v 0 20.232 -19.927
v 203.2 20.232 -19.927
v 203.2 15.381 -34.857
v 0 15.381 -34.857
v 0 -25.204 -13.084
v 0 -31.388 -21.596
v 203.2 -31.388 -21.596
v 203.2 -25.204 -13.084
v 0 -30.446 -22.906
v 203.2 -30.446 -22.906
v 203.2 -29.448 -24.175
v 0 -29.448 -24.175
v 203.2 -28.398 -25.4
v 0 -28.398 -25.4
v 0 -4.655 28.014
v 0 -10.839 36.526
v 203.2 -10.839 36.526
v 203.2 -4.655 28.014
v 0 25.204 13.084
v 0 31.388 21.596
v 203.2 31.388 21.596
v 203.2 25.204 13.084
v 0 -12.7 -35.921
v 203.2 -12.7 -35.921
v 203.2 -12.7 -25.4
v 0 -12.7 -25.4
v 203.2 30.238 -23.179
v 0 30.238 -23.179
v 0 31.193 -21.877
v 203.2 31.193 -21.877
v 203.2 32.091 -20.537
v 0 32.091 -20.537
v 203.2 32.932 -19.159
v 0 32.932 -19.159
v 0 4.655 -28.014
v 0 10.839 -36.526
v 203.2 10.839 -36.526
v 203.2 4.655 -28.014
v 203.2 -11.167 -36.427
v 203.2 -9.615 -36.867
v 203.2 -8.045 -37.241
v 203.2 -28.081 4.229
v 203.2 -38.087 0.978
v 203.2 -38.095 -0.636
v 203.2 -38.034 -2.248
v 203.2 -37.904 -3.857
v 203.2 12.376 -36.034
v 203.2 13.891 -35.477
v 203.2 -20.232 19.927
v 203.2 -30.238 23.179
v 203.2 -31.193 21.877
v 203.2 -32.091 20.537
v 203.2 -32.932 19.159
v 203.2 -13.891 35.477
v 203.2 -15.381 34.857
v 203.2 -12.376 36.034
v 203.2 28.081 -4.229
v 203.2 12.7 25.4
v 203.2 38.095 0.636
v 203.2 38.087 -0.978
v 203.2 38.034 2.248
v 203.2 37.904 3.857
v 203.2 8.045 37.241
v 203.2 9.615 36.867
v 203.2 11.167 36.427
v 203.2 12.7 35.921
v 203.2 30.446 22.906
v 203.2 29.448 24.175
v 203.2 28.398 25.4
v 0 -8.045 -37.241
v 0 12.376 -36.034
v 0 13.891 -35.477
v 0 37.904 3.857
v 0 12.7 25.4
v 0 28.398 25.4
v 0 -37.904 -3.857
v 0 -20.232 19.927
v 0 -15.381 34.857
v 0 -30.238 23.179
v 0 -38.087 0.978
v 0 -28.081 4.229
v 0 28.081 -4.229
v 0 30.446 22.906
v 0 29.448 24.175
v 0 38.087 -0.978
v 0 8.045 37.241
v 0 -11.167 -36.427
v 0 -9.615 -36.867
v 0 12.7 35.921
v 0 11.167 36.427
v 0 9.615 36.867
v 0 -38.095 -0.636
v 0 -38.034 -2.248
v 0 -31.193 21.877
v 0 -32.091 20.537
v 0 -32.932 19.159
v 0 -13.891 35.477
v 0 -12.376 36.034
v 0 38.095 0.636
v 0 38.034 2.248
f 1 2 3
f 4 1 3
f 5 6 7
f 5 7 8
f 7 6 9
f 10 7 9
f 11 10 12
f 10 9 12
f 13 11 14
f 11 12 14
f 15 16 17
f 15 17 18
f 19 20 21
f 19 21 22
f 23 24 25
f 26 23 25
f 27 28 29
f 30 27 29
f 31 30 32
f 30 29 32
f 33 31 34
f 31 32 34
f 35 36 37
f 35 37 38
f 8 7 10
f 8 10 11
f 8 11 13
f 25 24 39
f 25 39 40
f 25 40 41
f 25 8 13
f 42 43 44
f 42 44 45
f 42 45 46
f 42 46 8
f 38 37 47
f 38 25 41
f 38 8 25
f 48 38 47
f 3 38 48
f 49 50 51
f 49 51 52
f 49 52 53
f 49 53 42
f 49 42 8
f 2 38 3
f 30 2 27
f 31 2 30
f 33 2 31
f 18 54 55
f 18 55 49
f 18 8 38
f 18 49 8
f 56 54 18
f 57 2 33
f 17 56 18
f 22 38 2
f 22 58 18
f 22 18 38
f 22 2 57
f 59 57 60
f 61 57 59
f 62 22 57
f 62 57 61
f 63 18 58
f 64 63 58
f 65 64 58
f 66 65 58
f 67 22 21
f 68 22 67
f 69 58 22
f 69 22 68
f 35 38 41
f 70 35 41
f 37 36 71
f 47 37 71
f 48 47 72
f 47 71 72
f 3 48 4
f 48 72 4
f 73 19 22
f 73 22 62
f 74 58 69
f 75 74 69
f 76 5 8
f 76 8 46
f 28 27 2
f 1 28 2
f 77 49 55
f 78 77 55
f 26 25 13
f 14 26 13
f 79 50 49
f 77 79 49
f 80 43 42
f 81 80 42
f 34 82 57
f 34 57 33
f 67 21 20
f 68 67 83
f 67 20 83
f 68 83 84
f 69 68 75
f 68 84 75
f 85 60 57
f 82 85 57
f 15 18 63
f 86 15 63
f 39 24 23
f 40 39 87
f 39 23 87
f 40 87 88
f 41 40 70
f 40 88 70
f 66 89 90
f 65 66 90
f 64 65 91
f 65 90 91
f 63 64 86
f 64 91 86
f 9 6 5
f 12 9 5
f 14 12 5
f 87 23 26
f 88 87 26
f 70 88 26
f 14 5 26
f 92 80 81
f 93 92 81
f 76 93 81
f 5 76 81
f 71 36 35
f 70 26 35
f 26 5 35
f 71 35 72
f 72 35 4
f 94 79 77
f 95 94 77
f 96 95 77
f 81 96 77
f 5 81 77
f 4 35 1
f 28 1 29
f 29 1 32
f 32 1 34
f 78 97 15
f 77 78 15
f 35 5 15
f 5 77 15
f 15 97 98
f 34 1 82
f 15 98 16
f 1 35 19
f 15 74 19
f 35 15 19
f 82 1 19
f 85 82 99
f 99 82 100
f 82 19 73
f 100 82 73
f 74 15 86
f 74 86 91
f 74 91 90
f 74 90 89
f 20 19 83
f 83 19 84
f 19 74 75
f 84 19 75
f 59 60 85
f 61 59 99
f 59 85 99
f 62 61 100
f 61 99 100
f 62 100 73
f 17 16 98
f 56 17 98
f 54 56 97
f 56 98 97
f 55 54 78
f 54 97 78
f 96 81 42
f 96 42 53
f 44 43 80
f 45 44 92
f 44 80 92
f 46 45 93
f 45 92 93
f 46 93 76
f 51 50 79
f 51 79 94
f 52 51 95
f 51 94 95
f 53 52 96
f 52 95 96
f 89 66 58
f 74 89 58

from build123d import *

# Parameters (mm, degrees)
F0_R     = 38.1
F1_DEPTH = 203.2
F3_DEPTH = 228.6


with BuildPart() as f1:
    # F0 (on Right) → F1 (new body)
    with BuildSketch(Plane.YZ):
        Circle(F0_R)
    extrude(amount=F1_DEPTH)

    # F2 (on face) → F3 (cut)
    with BuildSketch(Plane.YZ.offset(203.2)):
        with BuildLine():
            Line((12.7, 35.9210244843), (12.7, 25.4))
            Line((12.7, 25.4), (28.3980633142, 25.4))
            ThreePointArc((28.3980633142, 25.4), (21.211687606, 31.6492386781), (12.7, 35.9210244843))
        make_face()
        with BuildLine():
            ThreePointArc((37.9042612368, 3.8570688473), (35.7635714939, 13.1368547986), (31.3883642677, 21.595846559))
            Line((31.3883642677, 21.595846559), (25.2042612368, 13.084158953))
            Line((25.2042612368, 13.084158953), (37.9042612368, 3.8570688473))
        make_face()
        with BuildLine():
            ThreePointArc((32.9323196853, -19.1591315081), (36.6549866302, -10.3933611087), (38.0874402363, -0.9782107359))
            Line((38.0874402363, -0.9782107359), (28.0813513425, -4.2293860998))
            Line((28.0813513425, -4.2293860998), (32.9323196853, -19.1591315081))
        make_face()
        with BuildLine():
            ThreePointArc((15.3813513425, -34.8571948223), (23.545442731, -29.9536663299), (30.2384085792, -23.1786247779))
            Line((30.2384085792, -23.1786247779), (20.2323196853, -19.9274494141))
            Line((20.2323196853, -19.9274494141), (15.3813513425, -34.8571948223))
        make_face()
        with BuildLine():
            Line((-4.6552295797, 28.0139043612), (8.0447704203, 37.2409944669))
            ThreePointArc((8.0447704203, 37.2409944669), (-1.4423399886, 38.0726891007), (-10.8393326105, 36.5255919673))
            Line((-10.8393326105, 36.5255919673), (-4.6552295797, 28.0139043612))
        make_face()
        with BuildLine():
            Line((-25.2042612368, -13.084158953), (-37.9042612368, -3.8570688473))
            ThreePointArc((-37.9042612368, -3.8570688473), (-35.7635714939, -13.1368547986), (-31.3883642677, -21.595846559))
            Line((-31.3883642677, -21.595846559), (-25.2042612368, -13.084158953))
        make_face()
        with BuildLine():
            Line((-12.7, -25.4), (-28.3980633142, -25.4))
            ThreePointArc((-28.3980633142, -25.4), (-21.211687606, -31.6492386781), (-12.7, -35.9210244843))
            Line((-12.7, -35.9210244843), (-12.7, -25.4))
        make_face()
        with BuildLine():
            ThreePointArc((-8.0447704203, -37.2409944669), (1.4423399886, -38.0726891007), (10.8393326105, -36.5255919673))
            Line((10.8393326105, -36.5255919673), (4.6552295797, -28.0139043612))
            Line((4.6552295797, -28.0139043612), (-8.0447704203, -37.2409944669))
        make_face()
        with BuildLine():
            Line((-28.0813513425, 4.2293860998), (-32.9323196853, 19.1591315081))
            ThreePointArc((-32.9323196853, 19.1591315081), (-36.6549866302, 10.3933611087), (-38.0874402363, 0.9782107359))
            Line((-38.0874402363, 0.9782107359), (-28.0813513425, 4.2293860998))
        make_face()
        with BuildLine():
            Line((-20.2323196853, 19.9274494141), (-15.3813513425, 34.8571948223))
            ThreePointArc((-15.3813513425, 34.8571948223), (-23.545442731, 29.9536663299), (-30.2384085792, 23.1786247779))
            Line((-30.2384085792, 23.1786247779), (-20.2323196853, 19.9274494141))
        make_face()
    extrude(amount=-F3_DEPTH, mode=Mode.SUBTRACT)


solid = f1.part
